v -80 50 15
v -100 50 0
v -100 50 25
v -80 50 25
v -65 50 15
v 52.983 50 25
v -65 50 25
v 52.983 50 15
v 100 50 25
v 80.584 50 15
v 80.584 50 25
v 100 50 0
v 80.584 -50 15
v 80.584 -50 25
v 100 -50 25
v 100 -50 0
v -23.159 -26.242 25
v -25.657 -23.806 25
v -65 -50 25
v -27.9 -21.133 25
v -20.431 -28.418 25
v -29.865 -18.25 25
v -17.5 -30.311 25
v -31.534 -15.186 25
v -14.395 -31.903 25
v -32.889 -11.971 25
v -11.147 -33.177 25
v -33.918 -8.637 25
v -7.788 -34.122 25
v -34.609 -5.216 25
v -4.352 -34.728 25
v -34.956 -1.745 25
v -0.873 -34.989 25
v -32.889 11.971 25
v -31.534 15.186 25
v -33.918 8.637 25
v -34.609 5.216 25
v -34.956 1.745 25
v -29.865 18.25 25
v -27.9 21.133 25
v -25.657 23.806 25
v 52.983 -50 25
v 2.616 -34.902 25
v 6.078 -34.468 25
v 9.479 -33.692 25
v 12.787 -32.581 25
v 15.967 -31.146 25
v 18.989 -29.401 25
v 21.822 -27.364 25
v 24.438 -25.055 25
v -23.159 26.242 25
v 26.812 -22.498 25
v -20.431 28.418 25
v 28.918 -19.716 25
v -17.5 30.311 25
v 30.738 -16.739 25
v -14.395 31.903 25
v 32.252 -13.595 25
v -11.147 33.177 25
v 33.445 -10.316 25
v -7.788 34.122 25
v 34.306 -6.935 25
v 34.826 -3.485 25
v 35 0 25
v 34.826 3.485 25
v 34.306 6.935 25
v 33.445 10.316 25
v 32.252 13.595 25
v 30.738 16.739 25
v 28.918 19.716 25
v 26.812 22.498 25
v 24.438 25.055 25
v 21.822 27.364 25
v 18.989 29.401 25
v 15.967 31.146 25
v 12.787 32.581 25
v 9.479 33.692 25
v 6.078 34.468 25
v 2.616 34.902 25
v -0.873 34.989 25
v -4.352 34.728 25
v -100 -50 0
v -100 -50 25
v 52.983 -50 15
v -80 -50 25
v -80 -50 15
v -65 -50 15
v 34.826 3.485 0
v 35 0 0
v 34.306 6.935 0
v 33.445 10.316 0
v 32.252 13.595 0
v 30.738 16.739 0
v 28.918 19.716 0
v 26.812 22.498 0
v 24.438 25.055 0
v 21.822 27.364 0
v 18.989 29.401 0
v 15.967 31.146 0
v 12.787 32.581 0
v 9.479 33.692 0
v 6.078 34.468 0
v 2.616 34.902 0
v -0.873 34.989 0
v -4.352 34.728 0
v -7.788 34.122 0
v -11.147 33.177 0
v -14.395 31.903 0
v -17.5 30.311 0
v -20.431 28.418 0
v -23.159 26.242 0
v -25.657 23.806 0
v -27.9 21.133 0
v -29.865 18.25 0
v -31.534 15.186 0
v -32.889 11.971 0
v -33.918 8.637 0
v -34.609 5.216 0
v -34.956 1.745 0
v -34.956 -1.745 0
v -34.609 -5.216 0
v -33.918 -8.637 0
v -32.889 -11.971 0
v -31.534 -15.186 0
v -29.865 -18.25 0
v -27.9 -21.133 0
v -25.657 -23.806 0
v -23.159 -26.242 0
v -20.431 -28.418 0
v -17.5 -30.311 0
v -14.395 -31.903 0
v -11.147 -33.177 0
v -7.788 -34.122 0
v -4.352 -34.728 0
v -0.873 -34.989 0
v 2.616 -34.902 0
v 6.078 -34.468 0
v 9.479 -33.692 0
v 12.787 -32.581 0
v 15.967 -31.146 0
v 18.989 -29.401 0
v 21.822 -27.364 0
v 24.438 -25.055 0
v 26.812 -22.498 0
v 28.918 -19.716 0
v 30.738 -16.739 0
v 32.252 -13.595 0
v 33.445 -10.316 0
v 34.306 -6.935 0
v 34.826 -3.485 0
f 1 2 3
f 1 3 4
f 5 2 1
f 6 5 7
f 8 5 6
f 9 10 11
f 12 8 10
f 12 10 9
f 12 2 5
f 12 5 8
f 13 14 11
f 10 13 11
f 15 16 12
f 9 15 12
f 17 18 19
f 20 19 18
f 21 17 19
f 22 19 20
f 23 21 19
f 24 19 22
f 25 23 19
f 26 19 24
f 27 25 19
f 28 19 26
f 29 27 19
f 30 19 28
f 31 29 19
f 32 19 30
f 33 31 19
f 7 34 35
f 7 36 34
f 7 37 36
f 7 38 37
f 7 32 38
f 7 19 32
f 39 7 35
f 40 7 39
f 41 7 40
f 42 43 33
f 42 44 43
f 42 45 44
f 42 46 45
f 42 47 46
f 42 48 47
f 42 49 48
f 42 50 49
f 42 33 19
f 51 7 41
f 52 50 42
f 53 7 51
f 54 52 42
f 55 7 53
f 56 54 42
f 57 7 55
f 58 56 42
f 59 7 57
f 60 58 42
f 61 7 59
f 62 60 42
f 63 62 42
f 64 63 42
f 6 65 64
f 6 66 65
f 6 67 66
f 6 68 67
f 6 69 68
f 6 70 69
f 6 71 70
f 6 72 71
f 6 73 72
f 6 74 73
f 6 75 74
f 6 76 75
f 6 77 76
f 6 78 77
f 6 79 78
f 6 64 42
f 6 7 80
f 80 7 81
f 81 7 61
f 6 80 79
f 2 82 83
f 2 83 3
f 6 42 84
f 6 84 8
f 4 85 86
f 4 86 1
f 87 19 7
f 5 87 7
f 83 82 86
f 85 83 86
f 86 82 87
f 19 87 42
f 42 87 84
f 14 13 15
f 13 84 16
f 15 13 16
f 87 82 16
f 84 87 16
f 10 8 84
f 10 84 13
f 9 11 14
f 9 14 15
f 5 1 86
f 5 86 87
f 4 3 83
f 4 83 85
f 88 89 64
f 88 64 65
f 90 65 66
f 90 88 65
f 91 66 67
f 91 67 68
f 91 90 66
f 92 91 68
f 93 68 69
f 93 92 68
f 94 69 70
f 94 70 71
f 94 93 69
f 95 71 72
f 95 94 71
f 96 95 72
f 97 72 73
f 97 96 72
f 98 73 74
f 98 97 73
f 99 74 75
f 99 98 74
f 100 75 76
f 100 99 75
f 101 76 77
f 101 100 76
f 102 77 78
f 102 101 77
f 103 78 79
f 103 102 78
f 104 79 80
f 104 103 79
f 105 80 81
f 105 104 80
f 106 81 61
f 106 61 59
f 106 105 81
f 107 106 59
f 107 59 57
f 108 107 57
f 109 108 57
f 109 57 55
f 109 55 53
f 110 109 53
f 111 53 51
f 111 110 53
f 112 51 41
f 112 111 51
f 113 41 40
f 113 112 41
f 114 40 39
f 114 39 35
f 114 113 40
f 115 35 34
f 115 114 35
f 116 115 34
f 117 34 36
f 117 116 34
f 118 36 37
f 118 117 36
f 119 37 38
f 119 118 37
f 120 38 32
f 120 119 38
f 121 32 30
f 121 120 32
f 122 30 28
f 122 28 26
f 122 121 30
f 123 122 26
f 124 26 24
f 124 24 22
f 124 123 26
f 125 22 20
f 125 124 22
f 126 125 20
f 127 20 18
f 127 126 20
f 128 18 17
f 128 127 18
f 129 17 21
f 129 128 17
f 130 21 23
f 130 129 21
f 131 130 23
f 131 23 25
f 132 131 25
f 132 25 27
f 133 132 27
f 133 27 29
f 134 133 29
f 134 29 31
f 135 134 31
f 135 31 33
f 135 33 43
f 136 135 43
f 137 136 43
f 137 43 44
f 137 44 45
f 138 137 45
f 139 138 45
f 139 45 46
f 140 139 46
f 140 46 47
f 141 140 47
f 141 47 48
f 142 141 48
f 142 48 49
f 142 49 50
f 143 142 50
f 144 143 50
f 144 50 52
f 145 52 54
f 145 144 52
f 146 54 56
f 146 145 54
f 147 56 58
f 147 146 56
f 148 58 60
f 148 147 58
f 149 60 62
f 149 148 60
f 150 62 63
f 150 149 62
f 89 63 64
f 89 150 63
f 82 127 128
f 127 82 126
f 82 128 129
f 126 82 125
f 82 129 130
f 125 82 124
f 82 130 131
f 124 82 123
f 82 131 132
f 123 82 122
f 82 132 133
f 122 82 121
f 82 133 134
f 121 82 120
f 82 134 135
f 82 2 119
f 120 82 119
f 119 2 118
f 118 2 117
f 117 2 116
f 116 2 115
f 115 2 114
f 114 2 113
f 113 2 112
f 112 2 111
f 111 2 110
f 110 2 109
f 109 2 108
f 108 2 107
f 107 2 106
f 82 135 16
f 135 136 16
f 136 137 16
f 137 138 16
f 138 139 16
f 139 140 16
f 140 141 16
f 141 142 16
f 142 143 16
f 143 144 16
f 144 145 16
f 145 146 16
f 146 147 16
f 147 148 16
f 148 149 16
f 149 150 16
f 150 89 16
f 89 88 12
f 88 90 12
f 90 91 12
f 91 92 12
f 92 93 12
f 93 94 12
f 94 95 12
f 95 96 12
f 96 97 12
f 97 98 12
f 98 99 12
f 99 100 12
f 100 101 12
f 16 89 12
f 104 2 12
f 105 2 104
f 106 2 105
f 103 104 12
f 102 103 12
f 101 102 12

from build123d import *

# Parameters (mm, degrees)
F0_W     = 200
F0_H     = 100
F0_R     = 35
F1_DEPTH = 25
F2_W     = 15
F2_H     = 100
F3_DEPTH = 10
F4_W     = 27.6011
F4_H     = 100
F5_DEPTH = 10


with BuildPart() as f1:
    # F0 (on Top) → F1 (new body)
    with BuildSketch(Plane.XY):
        Rectangle(F0_W, F0_H)
        Circle(F0_R, mode=Mode.SUBTRACT)
    extrude(amount=F1_DEPTH)

    # F2 (on face) → F3 (cut)
    with BuildSketch(Plane.XY.offset(25)):
        with Locations((-72.5, 0)):
            Rectangle(F2_W, F2_H)
    extrude(amount=-F3_DEPTH, mode=Mode.SUBTRACT)

    # F4 (on face) → F5 (cut)
    with BuildSketch(Plane.XY.offset(25)):
        with Locations((66.783089, 0)):
            Rectangle(F4_W, F4_H)
    extrude(amount=-F5_DEPTH, mode=Mode.SUBTRACT)


solid = f1.part
